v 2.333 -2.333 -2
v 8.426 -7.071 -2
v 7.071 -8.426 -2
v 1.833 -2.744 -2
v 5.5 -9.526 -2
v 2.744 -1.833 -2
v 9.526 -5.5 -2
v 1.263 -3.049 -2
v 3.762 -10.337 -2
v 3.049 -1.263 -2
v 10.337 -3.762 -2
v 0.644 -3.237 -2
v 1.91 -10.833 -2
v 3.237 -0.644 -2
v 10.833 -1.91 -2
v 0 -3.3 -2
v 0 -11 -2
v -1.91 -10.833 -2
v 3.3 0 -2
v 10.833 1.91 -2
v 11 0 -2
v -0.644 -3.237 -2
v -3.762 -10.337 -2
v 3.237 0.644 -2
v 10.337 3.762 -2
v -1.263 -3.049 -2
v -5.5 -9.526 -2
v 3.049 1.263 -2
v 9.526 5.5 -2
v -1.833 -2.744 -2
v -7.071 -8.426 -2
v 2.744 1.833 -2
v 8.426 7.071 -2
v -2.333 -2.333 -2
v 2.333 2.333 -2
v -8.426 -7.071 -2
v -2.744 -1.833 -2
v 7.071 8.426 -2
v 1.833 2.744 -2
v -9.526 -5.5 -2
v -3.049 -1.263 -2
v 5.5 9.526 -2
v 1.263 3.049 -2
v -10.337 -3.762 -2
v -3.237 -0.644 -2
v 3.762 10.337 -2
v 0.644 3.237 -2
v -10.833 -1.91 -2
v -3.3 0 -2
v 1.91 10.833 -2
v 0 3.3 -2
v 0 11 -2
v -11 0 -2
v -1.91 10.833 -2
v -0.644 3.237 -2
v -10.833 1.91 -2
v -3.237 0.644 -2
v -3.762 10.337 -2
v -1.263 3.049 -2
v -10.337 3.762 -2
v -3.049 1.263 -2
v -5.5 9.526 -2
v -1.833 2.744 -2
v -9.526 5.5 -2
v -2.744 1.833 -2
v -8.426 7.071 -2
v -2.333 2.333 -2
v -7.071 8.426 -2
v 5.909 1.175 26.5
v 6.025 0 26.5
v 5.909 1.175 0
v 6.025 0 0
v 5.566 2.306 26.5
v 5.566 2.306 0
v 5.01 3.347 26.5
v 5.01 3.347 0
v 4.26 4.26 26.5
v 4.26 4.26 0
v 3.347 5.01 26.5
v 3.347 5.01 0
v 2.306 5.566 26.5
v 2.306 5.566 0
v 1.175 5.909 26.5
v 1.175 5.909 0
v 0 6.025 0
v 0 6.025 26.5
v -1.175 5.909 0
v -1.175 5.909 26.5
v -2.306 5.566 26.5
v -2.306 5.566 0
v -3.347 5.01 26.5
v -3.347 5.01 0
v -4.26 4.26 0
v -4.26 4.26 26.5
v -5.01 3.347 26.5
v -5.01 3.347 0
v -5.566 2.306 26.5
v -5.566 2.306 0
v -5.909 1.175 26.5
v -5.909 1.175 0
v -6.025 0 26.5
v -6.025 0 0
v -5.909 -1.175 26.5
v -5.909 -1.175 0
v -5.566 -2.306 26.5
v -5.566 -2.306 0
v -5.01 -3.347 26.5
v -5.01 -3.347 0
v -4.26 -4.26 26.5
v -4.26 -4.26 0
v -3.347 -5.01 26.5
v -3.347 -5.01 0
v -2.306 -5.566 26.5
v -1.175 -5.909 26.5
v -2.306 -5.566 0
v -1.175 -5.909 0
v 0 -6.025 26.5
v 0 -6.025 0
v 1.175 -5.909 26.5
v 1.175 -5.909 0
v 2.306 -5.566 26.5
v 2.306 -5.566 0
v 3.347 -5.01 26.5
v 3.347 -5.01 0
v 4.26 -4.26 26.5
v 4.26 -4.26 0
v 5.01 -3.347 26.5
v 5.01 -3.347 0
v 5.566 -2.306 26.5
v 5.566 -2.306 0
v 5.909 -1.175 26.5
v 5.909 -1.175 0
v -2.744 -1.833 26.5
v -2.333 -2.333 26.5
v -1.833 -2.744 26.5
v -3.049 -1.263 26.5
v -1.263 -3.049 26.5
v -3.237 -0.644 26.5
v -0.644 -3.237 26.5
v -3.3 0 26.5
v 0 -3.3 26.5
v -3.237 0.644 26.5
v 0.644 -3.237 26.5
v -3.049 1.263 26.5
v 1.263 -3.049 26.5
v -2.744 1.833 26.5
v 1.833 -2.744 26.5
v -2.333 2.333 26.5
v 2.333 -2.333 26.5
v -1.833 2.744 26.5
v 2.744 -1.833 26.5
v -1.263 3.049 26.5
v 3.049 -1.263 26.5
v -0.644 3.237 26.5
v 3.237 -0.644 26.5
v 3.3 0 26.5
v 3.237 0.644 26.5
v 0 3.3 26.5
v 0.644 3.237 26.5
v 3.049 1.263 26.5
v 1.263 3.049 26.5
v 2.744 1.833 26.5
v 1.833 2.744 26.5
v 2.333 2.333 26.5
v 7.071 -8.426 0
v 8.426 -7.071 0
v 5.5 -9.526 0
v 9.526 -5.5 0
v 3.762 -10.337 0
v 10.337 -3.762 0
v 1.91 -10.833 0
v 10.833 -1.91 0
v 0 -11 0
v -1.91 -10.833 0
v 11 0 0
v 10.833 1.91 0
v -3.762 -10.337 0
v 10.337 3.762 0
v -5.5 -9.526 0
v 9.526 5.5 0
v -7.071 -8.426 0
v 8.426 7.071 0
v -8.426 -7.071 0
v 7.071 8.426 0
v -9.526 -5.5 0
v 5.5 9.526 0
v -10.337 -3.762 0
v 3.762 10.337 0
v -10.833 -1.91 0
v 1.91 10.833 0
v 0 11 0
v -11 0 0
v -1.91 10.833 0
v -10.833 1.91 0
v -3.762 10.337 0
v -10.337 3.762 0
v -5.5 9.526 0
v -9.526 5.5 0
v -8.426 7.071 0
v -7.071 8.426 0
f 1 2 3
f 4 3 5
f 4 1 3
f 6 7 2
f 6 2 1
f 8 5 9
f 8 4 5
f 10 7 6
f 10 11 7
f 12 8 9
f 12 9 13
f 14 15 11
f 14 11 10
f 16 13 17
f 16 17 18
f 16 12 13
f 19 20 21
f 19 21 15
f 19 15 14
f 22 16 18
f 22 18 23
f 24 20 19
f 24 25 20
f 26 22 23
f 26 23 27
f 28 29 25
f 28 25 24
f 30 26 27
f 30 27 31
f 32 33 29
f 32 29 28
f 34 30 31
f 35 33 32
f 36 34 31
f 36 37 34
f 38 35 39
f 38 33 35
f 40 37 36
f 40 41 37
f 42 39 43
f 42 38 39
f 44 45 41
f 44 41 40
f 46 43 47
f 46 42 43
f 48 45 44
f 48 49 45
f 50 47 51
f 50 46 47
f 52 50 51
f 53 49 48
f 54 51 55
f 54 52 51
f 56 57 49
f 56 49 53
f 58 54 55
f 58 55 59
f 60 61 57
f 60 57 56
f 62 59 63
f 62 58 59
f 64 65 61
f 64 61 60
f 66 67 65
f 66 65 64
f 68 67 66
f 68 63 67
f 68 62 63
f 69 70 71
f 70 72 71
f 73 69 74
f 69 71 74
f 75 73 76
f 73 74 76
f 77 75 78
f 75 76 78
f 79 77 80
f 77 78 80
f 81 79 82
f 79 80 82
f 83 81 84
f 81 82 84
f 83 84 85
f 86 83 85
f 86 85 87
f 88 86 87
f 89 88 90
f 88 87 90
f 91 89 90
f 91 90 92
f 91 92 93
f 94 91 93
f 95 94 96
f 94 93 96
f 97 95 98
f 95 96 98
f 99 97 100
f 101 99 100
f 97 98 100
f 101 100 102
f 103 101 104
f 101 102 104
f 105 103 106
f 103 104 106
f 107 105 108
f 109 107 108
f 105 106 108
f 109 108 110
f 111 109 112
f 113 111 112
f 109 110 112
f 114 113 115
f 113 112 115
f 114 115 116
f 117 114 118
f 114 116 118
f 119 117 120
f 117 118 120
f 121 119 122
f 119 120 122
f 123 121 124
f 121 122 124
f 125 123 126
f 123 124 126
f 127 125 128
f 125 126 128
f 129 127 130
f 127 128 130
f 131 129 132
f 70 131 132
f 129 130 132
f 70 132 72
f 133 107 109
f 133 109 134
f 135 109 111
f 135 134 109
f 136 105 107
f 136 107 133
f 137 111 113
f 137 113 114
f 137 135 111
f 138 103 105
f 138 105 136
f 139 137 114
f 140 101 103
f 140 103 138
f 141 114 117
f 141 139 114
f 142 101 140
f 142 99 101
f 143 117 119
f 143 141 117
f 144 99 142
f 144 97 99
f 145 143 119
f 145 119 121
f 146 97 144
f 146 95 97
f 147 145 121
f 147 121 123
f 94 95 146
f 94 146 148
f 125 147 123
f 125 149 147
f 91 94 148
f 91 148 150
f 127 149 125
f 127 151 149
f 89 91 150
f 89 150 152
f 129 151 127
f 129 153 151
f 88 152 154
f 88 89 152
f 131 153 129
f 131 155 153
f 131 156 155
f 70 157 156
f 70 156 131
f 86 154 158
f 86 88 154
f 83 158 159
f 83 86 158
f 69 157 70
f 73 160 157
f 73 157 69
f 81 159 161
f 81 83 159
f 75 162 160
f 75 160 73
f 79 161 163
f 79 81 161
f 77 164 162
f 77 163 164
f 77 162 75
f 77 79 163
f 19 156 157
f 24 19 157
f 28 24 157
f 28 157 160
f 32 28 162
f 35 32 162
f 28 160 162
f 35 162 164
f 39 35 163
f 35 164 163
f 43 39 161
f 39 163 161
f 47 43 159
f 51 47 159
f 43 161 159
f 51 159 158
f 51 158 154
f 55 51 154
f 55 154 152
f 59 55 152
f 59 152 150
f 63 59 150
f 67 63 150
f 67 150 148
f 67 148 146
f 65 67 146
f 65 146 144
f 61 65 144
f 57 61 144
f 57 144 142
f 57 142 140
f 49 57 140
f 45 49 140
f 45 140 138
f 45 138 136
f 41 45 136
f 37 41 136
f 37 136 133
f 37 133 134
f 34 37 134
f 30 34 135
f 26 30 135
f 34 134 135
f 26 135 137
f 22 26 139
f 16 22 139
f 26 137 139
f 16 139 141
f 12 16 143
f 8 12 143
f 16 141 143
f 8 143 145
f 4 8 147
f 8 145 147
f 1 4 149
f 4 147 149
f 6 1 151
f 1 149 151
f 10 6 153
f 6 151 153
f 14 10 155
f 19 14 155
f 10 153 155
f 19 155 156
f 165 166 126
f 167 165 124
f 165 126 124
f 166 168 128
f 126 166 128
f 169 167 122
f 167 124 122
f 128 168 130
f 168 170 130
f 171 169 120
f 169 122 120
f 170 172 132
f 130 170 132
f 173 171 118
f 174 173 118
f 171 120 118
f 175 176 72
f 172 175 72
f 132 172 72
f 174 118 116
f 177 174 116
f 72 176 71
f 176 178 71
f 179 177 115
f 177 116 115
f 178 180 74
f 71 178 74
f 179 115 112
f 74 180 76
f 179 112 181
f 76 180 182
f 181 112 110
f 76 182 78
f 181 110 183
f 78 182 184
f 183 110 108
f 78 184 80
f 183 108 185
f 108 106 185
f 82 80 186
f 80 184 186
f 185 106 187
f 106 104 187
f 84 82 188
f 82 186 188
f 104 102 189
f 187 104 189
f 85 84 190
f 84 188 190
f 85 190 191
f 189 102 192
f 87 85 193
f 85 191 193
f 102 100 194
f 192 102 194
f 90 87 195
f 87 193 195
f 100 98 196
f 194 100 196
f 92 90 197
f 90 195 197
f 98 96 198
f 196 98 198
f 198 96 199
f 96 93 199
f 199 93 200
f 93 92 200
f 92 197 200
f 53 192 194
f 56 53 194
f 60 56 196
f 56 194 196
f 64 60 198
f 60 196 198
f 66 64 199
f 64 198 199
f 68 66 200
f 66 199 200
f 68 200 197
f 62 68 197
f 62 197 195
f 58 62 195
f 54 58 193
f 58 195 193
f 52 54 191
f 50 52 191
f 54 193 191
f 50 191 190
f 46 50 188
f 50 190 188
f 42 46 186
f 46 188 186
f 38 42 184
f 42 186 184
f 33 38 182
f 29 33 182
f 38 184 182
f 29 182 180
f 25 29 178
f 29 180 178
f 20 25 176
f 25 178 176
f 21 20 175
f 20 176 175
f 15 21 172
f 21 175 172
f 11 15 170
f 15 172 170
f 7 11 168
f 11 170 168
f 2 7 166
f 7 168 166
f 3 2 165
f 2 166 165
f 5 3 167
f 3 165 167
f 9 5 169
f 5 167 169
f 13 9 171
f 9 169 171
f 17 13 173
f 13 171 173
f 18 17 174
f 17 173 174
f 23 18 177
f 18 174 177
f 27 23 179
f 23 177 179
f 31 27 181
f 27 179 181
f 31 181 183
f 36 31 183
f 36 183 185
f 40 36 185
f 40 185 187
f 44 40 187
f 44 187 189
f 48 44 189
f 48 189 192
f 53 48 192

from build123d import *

# Parameters (mm, degrees)
SKETCH1_R           = 6.025
BOSS_EXTRUDE1_DEPTH = 10
SKETCH3_R           = 6.025
BOSS_EXTRUDE2_DEPTH = 16.5
SKETCH5_R           = 11
BOSS_EXTRUDE3_DEPTH = 2
SKETCH6_R           = 3.3
CUT_EXTRUDE3_DEPTH  = 29.5


with BuildPart() as part:
    # Sketch1 → Boss-Extrude1 (new body)
    with BuildSketch(Plane.XY):
        Circle(SKETCH1_R)
    extrude(amount=BOSS_EXTRUDE1_DEPTH)

    # Sketch3 → Boss-Extrude2 (add)
    with BuildSketch(Plane.XY.offset(10)):
        Circle(SKETCH3_R)
    extrude(amount=BOSS_EXTRUDE2_DEPTH)

    # Sketch5 → Boss-Extrude3 (add)
    with BuildSketch(Plane(origin=(0, 0, 0), x_dir=(-1, 0, 0), z_dir=(0, 0, -1))):
        Circle(SKETCH5_R)
    extrude(amount=BOSS_EXTRUDE3_DEPTH)

    # Sketch6 → Cut-Extrude3 (cut, through all)
    with BuildSketch(Plane.XY.offset(26.5)):
        Circle(SKETCH6_R)
    extrude(amount=-CUT_EXTRUDE3_DEPTH, mode=Mode.SUBTRACT)


solid = part.part
